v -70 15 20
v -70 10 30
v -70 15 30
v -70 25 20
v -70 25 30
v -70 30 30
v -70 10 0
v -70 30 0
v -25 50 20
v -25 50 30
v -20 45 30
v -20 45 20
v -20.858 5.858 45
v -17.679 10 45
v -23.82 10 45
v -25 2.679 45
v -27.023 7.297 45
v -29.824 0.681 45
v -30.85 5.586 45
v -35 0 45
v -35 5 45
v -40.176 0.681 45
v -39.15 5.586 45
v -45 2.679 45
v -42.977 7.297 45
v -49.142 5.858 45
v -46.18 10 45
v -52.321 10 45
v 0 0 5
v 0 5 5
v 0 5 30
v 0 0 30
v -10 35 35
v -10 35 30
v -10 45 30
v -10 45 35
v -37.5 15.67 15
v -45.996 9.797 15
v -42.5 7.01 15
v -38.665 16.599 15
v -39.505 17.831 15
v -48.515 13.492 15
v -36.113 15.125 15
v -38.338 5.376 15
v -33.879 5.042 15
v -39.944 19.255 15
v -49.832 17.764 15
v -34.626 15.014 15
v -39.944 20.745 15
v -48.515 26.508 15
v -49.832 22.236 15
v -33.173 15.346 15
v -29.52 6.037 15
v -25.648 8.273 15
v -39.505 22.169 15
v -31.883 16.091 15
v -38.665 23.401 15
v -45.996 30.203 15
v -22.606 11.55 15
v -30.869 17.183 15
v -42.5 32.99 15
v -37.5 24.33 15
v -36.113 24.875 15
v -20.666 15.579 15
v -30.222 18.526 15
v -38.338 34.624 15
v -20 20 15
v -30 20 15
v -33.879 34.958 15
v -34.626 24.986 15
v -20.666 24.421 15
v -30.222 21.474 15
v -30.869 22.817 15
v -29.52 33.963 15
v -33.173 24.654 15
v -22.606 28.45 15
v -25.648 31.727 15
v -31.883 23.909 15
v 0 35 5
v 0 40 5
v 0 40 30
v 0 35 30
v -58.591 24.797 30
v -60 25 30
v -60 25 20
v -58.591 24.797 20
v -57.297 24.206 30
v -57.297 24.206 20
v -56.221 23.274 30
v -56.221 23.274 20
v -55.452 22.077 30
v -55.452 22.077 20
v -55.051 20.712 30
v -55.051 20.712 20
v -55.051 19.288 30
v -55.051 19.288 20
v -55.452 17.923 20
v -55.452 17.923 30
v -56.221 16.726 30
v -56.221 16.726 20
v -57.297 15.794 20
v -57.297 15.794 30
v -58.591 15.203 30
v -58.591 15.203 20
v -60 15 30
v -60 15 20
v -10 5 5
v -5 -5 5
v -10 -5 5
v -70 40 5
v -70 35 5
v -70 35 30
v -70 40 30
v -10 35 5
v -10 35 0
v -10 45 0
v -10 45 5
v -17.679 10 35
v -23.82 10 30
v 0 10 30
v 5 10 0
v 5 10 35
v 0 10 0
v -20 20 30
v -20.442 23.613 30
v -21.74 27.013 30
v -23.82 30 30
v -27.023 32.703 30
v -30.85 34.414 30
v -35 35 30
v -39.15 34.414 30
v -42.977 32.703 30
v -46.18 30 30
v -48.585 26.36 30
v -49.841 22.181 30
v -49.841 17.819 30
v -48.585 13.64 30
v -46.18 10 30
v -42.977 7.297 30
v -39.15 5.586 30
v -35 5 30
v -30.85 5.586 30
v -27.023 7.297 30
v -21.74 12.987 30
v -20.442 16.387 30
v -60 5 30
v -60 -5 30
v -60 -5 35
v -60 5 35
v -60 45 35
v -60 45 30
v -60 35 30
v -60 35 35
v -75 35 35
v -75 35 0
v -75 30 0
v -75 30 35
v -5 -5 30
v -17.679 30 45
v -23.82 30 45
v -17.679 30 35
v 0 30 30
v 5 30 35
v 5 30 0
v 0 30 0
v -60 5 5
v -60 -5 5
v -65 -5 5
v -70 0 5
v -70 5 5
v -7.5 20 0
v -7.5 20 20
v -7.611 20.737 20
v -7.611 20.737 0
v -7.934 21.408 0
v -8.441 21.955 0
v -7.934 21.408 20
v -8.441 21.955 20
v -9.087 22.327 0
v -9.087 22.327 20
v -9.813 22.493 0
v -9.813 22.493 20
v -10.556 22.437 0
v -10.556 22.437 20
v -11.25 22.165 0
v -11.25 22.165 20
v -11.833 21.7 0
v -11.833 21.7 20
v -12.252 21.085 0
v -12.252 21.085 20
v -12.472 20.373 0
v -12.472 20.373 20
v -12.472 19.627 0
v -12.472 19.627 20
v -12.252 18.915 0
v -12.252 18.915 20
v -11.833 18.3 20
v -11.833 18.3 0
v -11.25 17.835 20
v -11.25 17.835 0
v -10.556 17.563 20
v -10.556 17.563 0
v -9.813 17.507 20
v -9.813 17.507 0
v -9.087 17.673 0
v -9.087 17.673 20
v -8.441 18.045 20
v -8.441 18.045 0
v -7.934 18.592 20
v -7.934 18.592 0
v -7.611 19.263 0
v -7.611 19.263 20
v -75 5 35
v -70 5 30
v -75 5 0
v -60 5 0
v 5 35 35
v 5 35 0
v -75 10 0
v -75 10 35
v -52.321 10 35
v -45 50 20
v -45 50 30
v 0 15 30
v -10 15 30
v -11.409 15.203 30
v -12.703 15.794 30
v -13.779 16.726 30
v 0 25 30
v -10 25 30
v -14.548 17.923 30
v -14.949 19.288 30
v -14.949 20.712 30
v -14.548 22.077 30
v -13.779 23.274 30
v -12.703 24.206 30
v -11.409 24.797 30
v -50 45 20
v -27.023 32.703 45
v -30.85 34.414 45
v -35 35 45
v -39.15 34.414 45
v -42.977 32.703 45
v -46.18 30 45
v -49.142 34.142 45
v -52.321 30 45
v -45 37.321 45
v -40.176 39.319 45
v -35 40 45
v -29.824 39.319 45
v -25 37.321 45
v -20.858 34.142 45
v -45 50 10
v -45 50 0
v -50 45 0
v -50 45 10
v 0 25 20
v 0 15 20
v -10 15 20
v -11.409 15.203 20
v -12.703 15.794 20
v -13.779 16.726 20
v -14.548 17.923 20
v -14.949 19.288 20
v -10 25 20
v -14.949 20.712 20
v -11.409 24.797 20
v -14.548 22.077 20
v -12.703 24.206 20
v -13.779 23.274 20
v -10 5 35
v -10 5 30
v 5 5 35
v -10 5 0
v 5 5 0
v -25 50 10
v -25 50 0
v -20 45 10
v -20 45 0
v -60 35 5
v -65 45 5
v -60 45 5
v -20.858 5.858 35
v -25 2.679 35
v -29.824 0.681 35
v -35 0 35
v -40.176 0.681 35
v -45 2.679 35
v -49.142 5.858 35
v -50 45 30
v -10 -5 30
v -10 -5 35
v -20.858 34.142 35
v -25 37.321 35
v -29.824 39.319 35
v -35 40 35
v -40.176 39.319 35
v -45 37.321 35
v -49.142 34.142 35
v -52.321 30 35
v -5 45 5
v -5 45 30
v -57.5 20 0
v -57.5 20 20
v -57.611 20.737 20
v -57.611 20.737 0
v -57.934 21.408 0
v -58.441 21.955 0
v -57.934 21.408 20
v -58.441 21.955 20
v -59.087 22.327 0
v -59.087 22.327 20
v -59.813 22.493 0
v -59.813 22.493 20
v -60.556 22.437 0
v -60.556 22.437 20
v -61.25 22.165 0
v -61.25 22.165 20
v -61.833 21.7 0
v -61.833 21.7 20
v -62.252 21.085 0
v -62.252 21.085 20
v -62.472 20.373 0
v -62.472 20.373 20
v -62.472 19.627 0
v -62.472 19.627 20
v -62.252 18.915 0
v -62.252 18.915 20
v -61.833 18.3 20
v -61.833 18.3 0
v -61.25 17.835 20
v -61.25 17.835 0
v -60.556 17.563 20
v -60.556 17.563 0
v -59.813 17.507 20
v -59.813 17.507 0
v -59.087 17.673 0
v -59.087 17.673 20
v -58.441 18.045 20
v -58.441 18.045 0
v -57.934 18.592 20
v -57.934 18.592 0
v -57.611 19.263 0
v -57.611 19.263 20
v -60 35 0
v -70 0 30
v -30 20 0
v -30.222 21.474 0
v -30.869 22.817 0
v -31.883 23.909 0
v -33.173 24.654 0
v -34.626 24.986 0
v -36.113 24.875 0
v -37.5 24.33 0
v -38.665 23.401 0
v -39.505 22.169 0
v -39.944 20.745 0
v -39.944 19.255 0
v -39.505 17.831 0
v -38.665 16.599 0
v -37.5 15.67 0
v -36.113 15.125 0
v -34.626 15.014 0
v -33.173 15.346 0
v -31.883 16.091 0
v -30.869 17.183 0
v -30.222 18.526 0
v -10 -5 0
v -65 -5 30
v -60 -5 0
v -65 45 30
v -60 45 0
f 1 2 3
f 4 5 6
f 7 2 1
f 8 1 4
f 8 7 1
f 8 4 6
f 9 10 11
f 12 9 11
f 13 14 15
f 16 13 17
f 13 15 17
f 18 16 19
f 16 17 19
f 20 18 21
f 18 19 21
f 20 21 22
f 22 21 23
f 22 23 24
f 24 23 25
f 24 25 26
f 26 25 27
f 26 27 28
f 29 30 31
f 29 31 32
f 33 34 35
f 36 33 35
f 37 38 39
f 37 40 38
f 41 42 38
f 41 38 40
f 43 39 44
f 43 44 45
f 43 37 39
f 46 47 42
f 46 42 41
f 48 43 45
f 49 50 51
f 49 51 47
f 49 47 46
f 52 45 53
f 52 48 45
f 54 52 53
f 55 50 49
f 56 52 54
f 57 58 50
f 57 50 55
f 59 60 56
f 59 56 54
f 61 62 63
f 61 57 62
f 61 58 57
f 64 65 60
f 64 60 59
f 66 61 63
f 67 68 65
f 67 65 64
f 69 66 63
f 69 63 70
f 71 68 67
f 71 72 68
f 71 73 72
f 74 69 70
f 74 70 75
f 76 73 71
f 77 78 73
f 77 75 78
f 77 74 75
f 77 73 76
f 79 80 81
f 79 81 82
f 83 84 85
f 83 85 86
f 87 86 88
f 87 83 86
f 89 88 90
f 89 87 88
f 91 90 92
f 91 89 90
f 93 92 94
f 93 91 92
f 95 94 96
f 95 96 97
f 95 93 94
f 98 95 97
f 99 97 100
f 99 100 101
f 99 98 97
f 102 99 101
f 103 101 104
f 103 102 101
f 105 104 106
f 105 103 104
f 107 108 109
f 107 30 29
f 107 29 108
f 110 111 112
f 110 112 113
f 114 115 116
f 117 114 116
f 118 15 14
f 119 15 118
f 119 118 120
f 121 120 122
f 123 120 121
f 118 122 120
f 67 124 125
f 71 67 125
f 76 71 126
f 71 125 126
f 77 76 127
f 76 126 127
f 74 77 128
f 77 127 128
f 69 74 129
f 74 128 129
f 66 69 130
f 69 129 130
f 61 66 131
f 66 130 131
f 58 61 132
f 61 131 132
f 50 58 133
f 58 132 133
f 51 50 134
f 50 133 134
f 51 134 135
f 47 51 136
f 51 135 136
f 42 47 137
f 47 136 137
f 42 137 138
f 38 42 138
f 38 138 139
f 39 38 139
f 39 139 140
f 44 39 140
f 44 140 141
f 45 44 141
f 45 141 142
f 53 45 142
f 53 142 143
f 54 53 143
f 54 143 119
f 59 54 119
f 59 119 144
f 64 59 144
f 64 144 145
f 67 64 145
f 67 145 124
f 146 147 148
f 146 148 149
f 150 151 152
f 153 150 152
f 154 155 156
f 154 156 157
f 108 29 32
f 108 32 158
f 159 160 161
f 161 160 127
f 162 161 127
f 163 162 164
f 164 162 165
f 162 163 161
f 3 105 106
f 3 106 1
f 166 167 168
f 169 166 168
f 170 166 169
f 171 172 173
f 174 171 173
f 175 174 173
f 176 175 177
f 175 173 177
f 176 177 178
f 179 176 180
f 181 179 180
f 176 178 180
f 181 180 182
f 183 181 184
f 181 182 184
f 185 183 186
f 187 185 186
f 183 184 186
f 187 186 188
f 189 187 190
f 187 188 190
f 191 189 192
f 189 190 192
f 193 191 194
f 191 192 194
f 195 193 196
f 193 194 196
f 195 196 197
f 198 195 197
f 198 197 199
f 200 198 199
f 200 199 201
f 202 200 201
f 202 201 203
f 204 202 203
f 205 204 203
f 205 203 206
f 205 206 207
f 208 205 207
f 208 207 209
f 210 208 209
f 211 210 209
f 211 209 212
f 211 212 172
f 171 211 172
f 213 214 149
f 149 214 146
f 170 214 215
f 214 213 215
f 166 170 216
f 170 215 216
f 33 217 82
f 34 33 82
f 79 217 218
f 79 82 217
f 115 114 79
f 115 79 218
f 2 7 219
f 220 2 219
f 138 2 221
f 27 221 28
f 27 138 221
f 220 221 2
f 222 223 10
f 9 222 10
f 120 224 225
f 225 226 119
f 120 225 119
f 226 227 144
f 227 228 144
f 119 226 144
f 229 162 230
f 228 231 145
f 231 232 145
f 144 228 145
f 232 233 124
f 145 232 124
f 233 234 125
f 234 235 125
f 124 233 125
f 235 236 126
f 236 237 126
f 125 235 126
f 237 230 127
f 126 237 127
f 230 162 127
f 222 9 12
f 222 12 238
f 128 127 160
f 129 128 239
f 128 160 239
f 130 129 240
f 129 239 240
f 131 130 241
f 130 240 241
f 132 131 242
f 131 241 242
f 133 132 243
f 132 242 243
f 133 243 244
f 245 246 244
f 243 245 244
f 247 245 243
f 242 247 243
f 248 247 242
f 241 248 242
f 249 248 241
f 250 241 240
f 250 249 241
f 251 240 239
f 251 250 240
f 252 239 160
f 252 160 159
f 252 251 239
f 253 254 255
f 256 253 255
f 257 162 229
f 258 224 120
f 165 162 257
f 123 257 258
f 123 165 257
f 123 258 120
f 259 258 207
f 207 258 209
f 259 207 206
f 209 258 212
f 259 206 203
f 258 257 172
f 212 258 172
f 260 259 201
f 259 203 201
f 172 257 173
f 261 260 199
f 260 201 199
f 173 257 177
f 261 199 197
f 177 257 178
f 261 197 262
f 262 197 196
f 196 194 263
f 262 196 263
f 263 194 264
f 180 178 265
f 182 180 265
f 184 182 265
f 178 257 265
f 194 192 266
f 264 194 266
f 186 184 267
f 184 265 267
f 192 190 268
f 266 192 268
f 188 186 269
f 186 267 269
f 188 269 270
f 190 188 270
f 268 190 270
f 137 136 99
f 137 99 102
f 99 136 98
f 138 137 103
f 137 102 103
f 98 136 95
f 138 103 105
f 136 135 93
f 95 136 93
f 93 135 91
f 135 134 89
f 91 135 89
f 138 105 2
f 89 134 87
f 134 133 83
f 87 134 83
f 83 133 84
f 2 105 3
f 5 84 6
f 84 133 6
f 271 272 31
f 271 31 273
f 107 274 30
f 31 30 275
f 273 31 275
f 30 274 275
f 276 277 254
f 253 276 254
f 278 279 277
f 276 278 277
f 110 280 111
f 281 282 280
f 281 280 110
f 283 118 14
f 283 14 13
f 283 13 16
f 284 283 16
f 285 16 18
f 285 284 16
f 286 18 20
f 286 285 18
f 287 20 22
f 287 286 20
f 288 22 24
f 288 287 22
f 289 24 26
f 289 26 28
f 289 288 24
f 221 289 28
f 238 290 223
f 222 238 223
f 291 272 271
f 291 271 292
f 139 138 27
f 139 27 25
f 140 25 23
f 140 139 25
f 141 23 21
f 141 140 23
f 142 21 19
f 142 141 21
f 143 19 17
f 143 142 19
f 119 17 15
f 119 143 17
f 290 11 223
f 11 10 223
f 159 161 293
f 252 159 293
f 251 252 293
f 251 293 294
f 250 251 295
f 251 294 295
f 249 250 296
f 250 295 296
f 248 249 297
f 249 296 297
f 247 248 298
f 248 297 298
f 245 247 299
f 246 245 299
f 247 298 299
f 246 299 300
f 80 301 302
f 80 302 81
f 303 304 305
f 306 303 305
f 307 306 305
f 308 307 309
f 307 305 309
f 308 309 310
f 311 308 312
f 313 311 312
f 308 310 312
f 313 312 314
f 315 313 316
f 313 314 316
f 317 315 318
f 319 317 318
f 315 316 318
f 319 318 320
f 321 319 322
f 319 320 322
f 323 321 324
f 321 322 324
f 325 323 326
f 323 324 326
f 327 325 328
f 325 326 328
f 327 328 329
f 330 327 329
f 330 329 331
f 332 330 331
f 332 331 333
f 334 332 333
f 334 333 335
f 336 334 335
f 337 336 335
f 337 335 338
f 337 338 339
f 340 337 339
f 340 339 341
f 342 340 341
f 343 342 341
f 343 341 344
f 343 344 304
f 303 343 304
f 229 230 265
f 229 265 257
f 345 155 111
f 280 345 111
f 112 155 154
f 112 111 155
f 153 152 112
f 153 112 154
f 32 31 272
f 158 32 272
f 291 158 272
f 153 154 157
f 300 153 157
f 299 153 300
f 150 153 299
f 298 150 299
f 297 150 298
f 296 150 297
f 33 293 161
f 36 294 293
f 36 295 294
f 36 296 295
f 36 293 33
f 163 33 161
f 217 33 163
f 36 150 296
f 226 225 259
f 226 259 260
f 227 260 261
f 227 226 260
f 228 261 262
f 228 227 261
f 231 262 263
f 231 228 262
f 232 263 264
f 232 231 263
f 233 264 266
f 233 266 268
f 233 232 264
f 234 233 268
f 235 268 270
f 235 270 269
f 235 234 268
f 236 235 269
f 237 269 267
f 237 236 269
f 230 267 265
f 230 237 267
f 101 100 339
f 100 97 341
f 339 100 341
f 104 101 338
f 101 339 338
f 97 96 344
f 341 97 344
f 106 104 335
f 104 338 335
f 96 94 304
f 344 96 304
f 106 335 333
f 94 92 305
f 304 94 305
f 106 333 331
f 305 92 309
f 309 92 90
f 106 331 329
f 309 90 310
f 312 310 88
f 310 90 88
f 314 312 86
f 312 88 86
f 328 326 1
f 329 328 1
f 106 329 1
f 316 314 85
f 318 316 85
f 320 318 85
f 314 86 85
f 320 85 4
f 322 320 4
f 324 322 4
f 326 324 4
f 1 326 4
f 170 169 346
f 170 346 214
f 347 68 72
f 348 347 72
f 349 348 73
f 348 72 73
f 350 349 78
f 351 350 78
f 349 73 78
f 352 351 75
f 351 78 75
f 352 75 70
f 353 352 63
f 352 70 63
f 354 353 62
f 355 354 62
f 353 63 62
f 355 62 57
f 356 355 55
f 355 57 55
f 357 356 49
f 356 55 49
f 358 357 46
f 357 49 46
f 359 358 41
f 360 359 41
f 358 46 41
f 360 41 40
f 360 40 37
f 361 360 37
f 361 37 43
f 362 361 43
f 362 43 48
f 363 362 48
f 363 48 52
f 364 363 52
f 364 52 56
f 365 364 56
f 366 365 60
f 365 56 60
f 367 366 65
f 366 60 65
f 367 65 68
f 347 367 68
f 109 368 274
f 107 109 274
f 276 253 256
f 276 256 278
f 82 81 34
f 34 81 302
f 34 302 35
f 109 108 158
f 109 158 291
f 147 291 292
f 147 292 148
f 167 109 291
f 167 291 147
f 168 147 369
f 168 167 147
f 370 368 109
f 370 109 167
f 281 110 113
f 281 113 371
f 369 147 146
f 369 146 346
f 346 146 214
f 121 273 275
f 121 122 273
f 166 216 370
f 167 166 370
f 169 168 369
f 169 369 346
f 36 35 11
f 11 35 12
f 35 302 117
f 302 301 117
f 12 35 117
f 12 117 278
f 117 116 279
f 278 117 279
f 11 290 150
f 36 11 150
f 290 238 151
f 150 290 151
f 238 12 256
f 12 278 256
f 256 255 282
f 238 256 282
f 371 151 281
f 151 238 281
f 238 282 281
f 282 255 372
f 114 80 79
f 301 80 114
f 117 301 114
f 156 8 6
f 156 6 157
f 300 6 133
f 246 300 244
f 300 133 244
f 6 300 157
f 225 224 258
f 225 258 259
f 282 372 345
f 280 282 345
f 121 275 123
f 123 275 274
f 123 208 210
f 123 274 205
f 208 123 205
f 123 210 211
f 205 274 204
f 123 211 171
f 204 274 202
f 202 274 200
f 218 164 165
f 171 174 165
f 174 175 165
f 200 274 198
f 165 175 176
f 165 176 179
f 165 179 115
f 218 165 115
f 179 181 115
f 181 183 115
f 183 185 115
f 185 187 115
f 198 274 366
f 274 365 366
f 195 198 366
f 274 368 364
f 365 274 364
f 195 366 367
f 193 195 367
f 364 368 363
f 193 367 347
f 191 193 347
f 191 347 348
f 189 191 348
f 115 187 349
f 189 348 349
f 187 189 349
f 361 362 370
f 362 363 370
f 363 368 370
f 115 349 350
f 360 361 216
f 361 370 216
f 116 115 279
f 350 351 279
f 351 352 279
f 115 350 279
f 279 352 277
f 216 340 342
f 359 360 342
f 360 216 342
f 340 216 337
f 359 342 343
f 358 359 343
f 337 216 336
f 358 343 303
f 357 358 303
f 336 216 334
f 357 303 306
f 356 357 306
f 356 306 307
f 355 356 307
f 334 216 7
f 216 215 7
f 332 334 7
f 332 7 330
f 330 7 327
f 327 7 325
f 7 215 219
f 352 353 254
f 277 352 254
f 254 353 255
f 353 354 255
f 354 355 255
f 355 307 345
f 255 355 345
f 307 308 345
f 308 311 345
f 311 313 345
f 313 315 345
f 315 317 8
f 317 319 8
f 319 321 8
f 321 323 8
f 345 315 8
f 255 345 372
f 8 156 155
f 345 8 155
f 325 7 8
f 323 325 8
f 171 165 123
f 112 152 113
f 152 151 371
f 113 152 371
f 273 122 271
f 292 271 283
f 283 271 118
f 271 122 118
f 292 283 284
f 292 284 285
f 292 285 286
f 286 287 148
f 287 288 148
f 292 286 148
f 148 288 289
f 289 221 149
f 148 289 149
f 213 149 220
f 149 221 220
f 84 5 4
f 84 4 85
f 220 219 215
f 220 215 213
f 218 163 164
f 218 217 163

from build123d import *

# Parameters (mm, degrees)
BOSS_EXTRUDE2_DEPTH  = 30
BOSS_EXTRUDE3_DEPTH  = 10
BOSS_EXTRUDE4_DEPTH  = 10
BOSS_EXTRUDE7_DEPTH  = 5
CUT_EXTRUDE9_DEPTH   = 10
SKETCH13_R           = 2.5
CUT_EXTRUDE10_DEPTH  = 190
SKETCH14_R           = 15
CUT_EXTRUDE12_DEPTH  = 15
CUT_EXTRUDE13_DEPTH  = 5
BOSS_EXTRUDE8_DEPTH  = 10
SKETCH17_R           = 5
CUT_EXTRUDE15_DEPTH  = 15
CUT_EXTRUDE16_DEPTH  = 5
SKETCH19_W           = 30
SKETCH19_H           = 5
BOSS_EXTRUDE9_DEPTH  = 5
SKETCH20_W           = 30
SKETCH20_H           = 5
BOSS_EXTRUDE10_DEPTH = 5


with BuildPart() as part:
    # Sketch2 → Boss-Extrude2 (new body)
    with BuildSketch(Plane.XY):
        Polygon((-70, 40), (-65, 45), (-5, 45), (0, 40), (0, 0), (-5, -5), (-65, -5), (-70, 0), align=None)
    extrude(amount=BOSS_EXTRUDE2_DEPTH)

    # Sketch4 → Boss-Extrude3 (add)
    with BuildSketch(Plane.XY.offset(30)):
        Polygon((-50, 45), (-45, 50), (-25, 50), (-20, 45), align=None)
    extrude(amount=-BOSS_EXTRUDE3_DEPTH)

    # Sketch5 → Boss-Extrude4 (add)
    with BuildSketch(Plane(origin=(0, 0, 0), x_dir=(-1, 0, 0), z_dir=(0, 0, -1))):
        Polygon((20, 45), (25, 50), (45, 50), (50, 45), align=None)
    extrude(amount=-BOSS_EXTRUDE4_DEPTH)

    # Sketch6 → Boss-Extrude7 (add)
    with BuildSketch(Plane.XY.offset(30)):
        Polygon((-75, 30), (5, 30), (5, 35), (-10, 35), (-10, 45), (-60, 45), (-60, 35), (-75, 35), align=None)
        Polygon((-75, 10), (5, 10), (5, 5), (-10, 5), (-10, -5), (-60, -5), (-60, 5), (-75, 5), align=None)
    extrude(amount=BOSS_EXTRUDE7_DEPTH)

    # Sketch12 → Cut-Extrude9 (cut)
    with BuildSketch(Plane.XY.offset(30)):
        with BuildLine():
            Line((-70, 25), (-60, 25))
            ThreePointArc((-60, 25), (-55, 20), (-60, 15))
            Line((-60, 15), (-70, 15))
            Line((-70, 15), (-70, 25))
        make_face()
        with BuildLine():
            Line((0, 15), (-10, 15))
            ThreePointArc((-10, 15), (-15, 20), (-10, 25))
            Line((-10, 25), (0, 25))
            Line((0, 25), (0, 15))
        make_face()
    extrude(amount=-CUT_EXTRUDE9_DEPTH, mode=Mode.SUBTRACT)

    # Sketch13 → Cut-Extrude10 (cut)
    with BuildSketch(Plane.XY.offset(20)):
        with Locations((-60, 20)):
            Circle(SKETCH13_R)
        with Locations((-10, 20)):
            Circle(SKETCH13_R)
    extrude(amount=-CUT_EXTRUDE10_DEPTH, mode=Mode.SUBTRACT)

    # Sketch14 → Cut-Extrude12 (cut)
    with BuildSketch(Plane.XY.offset(30)):
        with Locations((-35, 20)):
            Circle(SKETCH14_R)
    extrude(amount=-CUT_EXTRUDE12_DEPTH, mode=Mode.SUBTRACT)

    # Sketch15 → Cut-Extrude13 (cut)
    with BuildSketch(Plane.XY.offset(35)):
        with BuildLine():
            Line((-46.180339887, 10), (-23.819660113, 10))
            ThreePointArc((-23.819660113, 10), (-35, 5), (-46.180339887, 10))
        make_face()
        with BuildLine():
            Line((-46.180339887, 30), (-23.819660113, 30))
            ThreePointArc((-23.819660113, 30), (-35, 35), (-46.180339887, 30))
        make_face()
    extrude(amount=-CUT_EXTRUDE13_DEPTH, mode=Mode.SUBTRACT)

    # Sketch16 → Boss-Extrude8 (add)
    with BuildSketch(Plane.XY.offset(35)):
        with BuildLine():
            ThreePointArc((-17.679491924, 10), (-35, 0), (-52.320508076, 10))
            Line((-52.320508076, 10), (-46.180339887, 10))
            ThreePointArc((-46.180339887, 10), (-35, 5), (-23.819660113, 10))
            Line((-23.819660113, 10), (-17.679491924, 10))
        make_face()
        with BuildLine():
            Line((-52.320508076, 30), (-46.180339887, 30))
            ThreePointArc((-46.180339887, 30), (-35, 35), (-23.819660113, 30))
            Line((-23.819660113, 30), (-17.679491924, 30))
            ThreePointArc((-17.679491924, 30), (-35, 40), (-52.320508076, 30))
        make_face()
    extrude(amount=BOSS_EXTRUDE8_DEPTH)

    # Sketch17 → Cut-Extrude15 (cut)
    with BuildSketch(Plane.XY.offset(15)):
        with Locations((-35, 20)):
            Circle(SKETCH17_R)
    extrude(amount=-CUT_EXTRUDE15_DEPTH, mode=Mode.SUBTRACT)

    # Sketch18 → Cut-Extrude16 (cut)
    with BuildSketch(Plane(origin=(0, 0, 0), x_dir=(-1, 0, 0), z_dir=(0, 0, -1))):
        Polygon((5, -5), (10, -5), (10, 5), (0, 5), (0, 0), align=None)
        Polygon((0, 40), (0, 35), (10, 35), (10, 45), (5, 45), align=None)
        Polygon((60, 45), (60, 35), (70, 35), (70, 40), (65, 45), align=None)
        Polygon((70, 0), (70, 5), (60, 5), (60, -5), (65, -5), align=None)
    extrude(amount=-CUT_EXTRUDE16_DEPTH, mode=Mode.SUBTRACT)

    # Sketch19 → Boss-Extrude9 (add)
    with BuildSketch(Plane.ZY.offset(70)):
        with Locations((15, 32.5)):
            Rectangle(SKETCH19_W, SKETCH19_H)
        with Locations((15, 7.5)):
            Rectangle(SKETCH19_W, SKETCH19_H)
    extrude(amount=BOSS_EXTRUDE9_DEPTH)

    # Sketch20 → Boss-Extrude10 (add)
    with BuildSketch(Plane(origin=(0, 0, 0), x_dir=(0, 0, -1), z_dir=(1, 0, 0))):
        with Locations((-15, 32.5)):
            Rectangle(SKETCH20_W, SKETCH20_H)
        with Locations((-15, 7.5)):
            Rectangle(SKETCH20_W, SKETCH20_H)
    extrude(amount=BOSS_EXTRUDE10_DEPTH)


solid = part.part
